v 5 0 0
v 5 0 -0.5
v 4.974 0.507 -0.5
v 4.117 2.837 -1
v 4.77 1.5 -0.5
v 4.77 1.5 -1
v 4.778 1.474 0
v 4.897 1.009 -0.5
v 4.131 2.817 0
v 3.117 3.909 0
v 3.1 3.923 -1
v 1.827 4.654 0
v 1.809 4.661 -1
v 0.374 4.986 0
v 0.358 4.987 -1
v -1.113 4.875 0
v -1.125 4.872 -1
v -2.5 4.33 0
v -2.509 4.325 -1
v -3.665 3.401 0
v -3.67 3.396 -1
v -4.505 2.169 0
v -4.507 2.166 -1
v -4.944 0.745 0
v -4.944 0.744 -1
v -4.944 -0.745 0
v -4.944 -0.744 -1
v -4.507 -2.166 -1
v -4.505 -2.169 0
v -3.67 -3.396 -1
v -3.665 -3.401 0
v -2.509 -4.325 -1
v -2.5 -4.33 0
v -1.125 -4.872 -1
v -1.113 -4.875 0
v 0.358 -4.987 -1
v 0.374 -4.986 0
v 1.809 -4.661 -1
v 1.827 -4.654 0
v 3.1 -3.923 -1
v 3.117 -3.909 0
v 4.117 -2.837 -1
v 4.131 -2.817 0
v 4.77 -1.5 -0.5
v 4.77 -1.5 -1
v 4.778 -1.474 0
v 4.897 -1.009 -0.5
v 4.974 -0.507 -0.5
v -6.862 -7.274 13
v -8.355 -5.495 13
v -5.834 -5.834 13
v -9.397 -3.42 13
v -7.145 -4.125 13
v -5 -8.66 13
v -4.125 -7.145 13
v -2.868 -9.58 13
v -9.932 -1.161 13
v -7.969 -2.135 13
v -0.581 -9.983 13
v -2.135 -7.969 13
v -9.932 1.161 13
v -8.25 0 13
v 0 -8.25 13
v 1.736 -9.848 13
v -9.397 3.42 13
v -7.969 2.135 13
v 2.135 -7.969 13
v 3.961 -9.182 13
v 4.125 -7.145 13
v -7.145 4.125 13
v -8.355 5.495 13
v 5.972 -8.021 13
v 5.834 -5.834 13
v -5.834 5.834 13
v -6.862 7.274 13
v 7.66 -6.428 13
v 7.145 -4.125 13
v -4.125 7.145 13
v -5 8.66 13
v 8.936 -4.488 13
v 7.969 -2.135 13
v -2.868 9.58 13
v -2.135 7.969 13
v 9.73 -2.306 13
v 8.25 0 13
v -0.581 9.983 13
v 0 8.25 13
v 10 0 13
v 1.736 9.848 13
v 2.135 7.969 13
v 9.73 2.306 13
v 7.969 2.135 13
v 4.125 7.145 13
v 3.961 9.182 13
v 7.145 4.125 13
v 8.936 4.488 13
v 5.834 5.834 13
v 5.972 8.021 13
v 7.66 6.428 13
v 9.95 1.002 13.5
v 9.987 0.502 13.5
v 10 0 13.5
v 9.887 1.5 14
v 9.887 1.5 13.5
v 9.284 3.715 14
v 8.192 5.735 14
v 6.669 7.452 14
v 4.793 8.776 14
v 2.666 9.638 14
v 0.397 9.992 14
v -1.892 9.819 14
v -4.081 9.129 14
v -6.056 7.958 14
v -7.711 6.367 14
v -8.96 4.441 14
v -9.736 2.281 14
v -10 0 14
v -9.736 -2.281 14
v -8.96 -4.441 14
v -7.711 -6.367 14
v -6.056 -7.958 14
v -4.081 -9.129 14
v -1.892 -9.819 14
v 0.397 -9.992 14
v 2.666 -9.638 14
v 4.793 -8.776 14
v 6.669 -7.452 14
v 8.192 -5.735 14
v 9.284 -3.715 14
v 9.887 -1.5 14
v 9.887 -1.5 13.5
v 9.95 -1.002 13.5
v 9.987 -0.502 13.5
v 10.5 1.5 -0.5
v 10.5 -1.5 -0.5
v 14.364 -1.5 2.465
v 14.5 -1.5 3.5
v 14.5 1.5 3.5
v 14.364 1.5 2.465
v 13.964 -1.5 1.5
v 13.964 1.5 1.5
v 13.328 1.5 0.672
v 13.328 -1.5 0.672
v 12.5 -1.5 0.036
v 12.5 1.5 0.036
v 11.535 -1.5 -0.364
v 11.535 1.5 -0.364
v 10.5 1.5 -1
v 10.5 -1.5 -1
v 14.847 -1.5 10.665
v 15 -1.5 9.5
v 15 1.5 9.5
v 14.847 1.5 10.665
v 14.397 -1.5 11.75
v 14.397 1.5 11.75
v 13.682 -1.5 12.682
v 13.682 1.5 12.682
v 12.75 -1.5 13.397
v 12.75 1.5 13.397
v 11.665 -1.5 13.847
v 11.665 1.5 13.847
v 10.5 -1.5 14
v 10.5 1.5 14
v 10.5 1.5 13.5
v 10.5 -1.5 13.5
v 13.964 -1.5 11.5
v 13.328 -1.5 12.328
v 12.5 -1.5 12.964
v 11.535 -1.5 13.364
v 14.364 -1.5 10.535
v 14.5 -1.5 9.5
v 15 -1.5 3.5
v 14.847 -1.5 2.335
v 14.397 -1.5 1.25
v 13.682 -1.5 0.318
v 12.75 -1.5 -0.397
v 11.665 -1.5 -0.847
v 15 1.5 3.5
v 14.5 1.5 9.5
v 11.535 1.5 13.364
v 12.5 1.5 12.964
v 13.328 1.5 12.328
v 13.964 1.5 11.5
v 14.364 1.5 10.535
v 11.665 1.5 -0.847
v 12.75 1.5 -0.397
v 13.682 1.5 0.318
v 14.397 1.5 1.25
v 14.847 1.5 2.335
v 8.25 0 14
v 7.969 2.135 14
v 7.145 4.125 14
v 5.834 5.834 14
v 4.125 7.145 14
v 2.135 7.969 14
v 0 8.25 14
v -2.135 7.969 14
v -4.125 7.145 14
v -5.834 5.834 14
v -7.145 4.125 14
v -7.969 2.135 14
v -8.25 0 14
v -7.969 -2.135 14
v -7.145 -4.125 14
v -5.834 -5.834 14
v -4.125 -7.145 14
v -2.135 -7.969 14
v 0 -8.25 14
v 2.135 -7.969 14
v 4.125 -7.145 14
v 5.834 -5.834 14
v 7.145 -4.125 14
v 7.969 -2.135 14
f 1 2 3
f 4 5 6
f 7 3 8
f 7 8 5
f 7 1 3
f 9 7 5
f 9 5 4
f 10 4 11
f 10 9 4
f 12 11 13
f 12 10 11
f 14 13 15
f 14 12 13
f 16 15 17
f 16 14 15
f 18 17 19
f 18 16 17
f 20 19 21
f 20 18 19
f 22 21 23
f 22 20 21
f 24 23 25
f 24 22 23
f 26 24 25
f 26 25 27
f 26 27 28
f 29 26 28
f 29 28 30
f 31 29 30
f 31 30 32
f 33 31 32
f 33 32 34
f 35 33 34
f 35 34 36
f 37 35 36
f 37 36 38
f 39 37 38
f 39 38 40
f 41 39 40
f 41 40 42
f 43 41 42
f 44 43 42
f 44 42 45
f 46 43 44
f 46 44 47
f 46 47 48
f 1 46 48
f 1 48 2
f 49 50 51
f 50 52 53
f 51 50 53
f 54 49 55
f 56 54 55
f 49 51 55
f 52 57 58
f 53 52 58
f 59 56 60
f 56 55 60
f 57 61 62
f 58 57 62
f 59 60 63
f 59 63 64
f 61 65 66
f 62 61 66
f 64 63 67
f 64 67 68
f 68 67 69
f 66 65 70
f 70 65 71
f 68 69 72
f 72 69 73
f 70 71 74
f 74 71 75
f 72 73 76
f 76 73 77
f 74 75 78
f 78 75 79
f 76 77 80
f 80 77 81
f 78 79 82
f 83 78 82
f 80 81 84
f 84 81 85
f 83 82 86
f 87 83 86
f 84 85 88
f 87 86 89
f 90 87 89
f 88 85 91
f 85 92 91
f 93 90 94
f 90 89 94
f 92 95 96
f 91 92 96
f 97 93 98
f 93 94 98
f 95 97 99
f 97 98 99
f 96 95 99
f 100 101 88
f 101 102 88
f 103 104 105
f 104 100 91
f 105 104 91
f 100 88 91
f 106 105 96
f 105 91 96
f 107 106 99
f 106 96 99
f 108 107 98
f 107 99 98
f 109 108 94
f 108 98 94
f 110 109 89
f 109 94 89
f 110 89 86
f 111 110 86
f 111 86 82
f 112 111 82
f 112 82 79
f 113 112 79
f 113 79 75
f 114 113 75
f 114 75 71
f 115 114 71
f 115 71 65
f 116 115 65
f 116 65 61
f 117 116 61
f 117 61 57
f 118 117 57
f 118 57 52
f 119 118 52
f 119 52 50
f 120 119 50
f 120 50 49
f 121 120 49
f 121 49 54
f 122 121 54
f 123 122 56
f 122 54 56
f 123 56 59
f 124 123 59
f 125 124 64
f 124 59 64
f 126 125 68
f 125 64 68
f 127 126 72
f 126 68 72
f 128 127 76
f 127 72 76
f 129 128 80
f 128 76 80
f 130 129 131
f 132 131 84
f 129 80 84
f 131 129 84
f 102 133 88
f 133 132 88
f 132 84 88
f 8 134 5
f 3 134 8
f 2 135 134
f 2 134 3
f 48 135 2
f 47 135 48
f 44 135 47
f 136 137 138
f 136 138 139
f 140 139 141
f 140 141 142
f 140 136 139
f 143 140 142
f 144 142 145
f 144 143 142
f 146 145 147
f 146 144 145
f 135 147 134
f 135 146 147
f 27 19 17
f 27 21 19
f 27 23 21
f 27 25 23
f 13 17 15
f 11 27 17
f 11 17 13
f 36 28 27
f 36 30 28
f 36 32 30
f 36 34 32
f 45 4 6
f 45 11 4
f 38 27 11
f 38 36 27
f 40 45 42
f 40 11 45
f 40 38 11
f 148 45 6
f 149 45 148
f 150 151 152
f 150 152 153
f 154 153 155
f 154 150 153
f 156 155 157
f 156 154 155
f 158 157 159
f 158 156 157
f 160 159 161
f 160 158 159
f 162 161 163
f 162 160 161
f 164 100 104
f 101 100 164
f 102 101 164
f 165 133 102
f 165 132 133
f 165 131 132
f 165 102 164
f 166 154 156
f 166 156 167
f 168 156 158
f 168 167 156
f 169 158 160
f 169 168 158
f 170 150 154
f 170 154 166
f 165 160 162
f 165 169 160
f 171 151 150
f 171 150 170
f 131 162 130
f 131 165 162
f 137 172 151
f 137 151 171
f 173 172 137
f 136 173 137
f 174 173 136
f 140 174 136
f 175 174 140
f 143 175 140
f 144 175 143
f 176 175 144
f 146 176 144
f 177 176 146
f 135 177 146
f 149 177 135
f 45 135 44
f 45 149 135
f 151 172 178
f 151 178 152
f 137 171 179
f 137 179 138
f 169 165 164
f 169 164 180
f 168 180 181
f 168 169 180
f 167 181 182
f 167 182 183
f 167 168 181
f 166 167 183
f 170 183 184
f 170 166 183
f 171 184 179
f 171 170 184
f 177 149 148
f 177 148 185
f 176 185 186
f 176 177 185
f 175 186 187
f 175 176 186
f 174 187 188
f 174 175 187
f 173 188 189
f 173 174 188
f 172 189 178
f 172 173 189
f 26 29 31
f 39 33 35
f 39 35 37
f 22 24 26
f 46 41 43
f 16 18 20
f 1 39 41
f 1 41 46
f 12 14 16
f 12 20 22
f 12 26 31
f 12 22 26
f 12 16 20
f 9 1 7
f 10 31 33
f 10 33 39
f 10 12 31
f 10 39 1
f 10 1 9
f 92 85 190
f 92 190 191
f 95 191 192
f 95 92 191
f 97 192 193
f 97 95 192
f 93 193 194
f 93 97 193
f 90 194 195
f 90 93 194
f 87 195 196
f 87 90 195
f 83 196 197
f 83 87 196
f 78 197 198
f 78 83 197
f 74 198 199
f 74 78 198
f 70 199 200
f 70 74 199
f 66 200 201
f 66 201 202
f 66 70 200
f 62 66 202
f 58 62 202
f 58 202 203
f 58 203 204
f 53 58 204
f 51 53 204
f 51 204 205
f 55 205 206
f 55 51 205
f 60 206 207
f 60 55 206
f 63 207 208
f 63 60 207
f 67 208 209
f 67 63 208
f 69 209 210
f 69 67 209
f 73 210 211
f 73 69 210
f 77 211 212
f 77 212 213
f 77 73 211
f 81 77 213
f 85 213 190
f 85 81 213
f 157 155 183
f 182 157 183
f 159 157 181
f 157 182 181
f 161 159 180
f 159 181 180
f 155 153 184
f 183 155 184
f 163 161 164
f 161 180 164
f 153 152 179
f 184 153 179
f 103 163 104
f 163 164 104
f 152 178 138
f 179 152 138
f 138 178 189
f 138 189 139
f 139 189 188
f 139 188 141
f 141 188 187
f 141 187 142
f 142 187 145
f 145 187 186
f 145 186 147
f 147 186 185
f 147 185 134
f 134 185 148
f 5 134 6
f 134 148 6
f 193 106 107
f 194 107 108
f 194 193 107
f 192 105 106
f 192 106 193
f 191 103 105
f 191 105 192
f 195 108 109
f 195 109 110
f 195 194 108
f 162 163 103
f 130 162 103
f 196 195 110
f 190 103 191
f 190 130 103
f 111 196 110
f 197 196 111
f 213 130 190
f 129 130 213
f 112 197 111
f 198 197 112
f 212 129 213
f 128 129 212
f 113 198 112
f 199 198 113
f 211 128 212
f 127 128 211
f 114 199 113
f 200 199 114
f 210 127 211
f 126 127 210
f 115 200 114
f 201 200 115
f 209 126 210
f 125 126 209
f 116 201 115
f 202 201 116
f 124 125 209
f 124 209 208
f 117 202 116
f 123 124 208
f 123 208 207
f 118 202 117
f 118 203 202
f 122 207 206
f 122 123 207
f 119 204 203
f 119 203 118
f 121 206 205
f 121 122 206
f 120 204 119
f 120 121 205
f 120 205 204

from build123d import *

# Parameters (mm, degrees)
SKETCH7_R                = 10
SKETCH7_R_2              = 8.25
BOSS_EXTRUDE3_DEPTH      = 1
SKETCH8_R                = 5
BOSS_EXTRUDE4_DEPTH      = 1
BOSS_EXTRUDE5_DEPTH      = 1.5
BOSS_EXTRUDE5_DEPTH_BACK = 1.5


with BuildPart() as part:
    # Sketch7 → Boss-Extrude3 (new body)
    with BuildSketch(Plane.XY.offset(13)):
        Circle(SKETCH7_R)
        Circle(SKETCH7_R_2, mode=Mode.SUBTRACT)
    extrude(amount=BOSS_EXTRUDE3_DEPTH)



with BuildPart() as body_2:
    # Sketch8 → Boss-Extrude4 (new body)
    with BuildSketch(Plane.XY):
        Circle(SKETCH8_R)
    extrude(amount=-BOSS_EXTRUDE4_DEPTH)


with BuildPart() as part_1:
    add(part.part)

    add(body_2.part)  # Boss-Extrude5 merges body 2
    # Sketch9 → Boss-Extrude5 (add, two sides: drawn at the far end of the back side and taken through both)
    with BuildSketch(Plane(origin=(0, 0, 0), x_dir=(1, 0, 0), z_dir=(0, 1, 0)).offset(-BOSS_EXTRUDE5_DEPTH_BACK)):
        with BuildLine():
            Line((10, -13.5), (10.5, -13.5))
            ThreePointArc((10.5, -13.5), (13.328427125, -12.328427125), (14.5, -9.5))
            Line((14.5, -9.5), (14.5, -3.5))
            ThreePointArc((14.5, -3.5), (13.328427125, -0.671572875), (10.5, 0.5))
            Line((10.5, 0.5), (5, 0.5))
            Line((5, 0.5), (4.7, 0.5))
            Line((4.7, 0.5), (4.7, 1))
            Line((4.7, 1), (5, 1))
            Line((5, 1), (10.5, 1))
            ThreePointArc((10.5, 1), (13.681980515, -0.318019485), (15, -3.5))
            Line((15, -3.5), (15, -9.5))
            ThreePointArc((15, -9.5), (13.681980515, -12.681980515), (10.5, -14))
            Line((10.5, -14), (10, -14))
            Line((10, -14), (9.7, -14))
            Line((9.7, -14), (9.7, -13.5))
            Line((9.7, -13.5), (10, -13.5))
        make_face()
    extrude(amount=BOSS_EXTRUDE5_DEPTH + BOSS_EXTRUDE5_DEPTH_BACK)


solid = part_1.part
